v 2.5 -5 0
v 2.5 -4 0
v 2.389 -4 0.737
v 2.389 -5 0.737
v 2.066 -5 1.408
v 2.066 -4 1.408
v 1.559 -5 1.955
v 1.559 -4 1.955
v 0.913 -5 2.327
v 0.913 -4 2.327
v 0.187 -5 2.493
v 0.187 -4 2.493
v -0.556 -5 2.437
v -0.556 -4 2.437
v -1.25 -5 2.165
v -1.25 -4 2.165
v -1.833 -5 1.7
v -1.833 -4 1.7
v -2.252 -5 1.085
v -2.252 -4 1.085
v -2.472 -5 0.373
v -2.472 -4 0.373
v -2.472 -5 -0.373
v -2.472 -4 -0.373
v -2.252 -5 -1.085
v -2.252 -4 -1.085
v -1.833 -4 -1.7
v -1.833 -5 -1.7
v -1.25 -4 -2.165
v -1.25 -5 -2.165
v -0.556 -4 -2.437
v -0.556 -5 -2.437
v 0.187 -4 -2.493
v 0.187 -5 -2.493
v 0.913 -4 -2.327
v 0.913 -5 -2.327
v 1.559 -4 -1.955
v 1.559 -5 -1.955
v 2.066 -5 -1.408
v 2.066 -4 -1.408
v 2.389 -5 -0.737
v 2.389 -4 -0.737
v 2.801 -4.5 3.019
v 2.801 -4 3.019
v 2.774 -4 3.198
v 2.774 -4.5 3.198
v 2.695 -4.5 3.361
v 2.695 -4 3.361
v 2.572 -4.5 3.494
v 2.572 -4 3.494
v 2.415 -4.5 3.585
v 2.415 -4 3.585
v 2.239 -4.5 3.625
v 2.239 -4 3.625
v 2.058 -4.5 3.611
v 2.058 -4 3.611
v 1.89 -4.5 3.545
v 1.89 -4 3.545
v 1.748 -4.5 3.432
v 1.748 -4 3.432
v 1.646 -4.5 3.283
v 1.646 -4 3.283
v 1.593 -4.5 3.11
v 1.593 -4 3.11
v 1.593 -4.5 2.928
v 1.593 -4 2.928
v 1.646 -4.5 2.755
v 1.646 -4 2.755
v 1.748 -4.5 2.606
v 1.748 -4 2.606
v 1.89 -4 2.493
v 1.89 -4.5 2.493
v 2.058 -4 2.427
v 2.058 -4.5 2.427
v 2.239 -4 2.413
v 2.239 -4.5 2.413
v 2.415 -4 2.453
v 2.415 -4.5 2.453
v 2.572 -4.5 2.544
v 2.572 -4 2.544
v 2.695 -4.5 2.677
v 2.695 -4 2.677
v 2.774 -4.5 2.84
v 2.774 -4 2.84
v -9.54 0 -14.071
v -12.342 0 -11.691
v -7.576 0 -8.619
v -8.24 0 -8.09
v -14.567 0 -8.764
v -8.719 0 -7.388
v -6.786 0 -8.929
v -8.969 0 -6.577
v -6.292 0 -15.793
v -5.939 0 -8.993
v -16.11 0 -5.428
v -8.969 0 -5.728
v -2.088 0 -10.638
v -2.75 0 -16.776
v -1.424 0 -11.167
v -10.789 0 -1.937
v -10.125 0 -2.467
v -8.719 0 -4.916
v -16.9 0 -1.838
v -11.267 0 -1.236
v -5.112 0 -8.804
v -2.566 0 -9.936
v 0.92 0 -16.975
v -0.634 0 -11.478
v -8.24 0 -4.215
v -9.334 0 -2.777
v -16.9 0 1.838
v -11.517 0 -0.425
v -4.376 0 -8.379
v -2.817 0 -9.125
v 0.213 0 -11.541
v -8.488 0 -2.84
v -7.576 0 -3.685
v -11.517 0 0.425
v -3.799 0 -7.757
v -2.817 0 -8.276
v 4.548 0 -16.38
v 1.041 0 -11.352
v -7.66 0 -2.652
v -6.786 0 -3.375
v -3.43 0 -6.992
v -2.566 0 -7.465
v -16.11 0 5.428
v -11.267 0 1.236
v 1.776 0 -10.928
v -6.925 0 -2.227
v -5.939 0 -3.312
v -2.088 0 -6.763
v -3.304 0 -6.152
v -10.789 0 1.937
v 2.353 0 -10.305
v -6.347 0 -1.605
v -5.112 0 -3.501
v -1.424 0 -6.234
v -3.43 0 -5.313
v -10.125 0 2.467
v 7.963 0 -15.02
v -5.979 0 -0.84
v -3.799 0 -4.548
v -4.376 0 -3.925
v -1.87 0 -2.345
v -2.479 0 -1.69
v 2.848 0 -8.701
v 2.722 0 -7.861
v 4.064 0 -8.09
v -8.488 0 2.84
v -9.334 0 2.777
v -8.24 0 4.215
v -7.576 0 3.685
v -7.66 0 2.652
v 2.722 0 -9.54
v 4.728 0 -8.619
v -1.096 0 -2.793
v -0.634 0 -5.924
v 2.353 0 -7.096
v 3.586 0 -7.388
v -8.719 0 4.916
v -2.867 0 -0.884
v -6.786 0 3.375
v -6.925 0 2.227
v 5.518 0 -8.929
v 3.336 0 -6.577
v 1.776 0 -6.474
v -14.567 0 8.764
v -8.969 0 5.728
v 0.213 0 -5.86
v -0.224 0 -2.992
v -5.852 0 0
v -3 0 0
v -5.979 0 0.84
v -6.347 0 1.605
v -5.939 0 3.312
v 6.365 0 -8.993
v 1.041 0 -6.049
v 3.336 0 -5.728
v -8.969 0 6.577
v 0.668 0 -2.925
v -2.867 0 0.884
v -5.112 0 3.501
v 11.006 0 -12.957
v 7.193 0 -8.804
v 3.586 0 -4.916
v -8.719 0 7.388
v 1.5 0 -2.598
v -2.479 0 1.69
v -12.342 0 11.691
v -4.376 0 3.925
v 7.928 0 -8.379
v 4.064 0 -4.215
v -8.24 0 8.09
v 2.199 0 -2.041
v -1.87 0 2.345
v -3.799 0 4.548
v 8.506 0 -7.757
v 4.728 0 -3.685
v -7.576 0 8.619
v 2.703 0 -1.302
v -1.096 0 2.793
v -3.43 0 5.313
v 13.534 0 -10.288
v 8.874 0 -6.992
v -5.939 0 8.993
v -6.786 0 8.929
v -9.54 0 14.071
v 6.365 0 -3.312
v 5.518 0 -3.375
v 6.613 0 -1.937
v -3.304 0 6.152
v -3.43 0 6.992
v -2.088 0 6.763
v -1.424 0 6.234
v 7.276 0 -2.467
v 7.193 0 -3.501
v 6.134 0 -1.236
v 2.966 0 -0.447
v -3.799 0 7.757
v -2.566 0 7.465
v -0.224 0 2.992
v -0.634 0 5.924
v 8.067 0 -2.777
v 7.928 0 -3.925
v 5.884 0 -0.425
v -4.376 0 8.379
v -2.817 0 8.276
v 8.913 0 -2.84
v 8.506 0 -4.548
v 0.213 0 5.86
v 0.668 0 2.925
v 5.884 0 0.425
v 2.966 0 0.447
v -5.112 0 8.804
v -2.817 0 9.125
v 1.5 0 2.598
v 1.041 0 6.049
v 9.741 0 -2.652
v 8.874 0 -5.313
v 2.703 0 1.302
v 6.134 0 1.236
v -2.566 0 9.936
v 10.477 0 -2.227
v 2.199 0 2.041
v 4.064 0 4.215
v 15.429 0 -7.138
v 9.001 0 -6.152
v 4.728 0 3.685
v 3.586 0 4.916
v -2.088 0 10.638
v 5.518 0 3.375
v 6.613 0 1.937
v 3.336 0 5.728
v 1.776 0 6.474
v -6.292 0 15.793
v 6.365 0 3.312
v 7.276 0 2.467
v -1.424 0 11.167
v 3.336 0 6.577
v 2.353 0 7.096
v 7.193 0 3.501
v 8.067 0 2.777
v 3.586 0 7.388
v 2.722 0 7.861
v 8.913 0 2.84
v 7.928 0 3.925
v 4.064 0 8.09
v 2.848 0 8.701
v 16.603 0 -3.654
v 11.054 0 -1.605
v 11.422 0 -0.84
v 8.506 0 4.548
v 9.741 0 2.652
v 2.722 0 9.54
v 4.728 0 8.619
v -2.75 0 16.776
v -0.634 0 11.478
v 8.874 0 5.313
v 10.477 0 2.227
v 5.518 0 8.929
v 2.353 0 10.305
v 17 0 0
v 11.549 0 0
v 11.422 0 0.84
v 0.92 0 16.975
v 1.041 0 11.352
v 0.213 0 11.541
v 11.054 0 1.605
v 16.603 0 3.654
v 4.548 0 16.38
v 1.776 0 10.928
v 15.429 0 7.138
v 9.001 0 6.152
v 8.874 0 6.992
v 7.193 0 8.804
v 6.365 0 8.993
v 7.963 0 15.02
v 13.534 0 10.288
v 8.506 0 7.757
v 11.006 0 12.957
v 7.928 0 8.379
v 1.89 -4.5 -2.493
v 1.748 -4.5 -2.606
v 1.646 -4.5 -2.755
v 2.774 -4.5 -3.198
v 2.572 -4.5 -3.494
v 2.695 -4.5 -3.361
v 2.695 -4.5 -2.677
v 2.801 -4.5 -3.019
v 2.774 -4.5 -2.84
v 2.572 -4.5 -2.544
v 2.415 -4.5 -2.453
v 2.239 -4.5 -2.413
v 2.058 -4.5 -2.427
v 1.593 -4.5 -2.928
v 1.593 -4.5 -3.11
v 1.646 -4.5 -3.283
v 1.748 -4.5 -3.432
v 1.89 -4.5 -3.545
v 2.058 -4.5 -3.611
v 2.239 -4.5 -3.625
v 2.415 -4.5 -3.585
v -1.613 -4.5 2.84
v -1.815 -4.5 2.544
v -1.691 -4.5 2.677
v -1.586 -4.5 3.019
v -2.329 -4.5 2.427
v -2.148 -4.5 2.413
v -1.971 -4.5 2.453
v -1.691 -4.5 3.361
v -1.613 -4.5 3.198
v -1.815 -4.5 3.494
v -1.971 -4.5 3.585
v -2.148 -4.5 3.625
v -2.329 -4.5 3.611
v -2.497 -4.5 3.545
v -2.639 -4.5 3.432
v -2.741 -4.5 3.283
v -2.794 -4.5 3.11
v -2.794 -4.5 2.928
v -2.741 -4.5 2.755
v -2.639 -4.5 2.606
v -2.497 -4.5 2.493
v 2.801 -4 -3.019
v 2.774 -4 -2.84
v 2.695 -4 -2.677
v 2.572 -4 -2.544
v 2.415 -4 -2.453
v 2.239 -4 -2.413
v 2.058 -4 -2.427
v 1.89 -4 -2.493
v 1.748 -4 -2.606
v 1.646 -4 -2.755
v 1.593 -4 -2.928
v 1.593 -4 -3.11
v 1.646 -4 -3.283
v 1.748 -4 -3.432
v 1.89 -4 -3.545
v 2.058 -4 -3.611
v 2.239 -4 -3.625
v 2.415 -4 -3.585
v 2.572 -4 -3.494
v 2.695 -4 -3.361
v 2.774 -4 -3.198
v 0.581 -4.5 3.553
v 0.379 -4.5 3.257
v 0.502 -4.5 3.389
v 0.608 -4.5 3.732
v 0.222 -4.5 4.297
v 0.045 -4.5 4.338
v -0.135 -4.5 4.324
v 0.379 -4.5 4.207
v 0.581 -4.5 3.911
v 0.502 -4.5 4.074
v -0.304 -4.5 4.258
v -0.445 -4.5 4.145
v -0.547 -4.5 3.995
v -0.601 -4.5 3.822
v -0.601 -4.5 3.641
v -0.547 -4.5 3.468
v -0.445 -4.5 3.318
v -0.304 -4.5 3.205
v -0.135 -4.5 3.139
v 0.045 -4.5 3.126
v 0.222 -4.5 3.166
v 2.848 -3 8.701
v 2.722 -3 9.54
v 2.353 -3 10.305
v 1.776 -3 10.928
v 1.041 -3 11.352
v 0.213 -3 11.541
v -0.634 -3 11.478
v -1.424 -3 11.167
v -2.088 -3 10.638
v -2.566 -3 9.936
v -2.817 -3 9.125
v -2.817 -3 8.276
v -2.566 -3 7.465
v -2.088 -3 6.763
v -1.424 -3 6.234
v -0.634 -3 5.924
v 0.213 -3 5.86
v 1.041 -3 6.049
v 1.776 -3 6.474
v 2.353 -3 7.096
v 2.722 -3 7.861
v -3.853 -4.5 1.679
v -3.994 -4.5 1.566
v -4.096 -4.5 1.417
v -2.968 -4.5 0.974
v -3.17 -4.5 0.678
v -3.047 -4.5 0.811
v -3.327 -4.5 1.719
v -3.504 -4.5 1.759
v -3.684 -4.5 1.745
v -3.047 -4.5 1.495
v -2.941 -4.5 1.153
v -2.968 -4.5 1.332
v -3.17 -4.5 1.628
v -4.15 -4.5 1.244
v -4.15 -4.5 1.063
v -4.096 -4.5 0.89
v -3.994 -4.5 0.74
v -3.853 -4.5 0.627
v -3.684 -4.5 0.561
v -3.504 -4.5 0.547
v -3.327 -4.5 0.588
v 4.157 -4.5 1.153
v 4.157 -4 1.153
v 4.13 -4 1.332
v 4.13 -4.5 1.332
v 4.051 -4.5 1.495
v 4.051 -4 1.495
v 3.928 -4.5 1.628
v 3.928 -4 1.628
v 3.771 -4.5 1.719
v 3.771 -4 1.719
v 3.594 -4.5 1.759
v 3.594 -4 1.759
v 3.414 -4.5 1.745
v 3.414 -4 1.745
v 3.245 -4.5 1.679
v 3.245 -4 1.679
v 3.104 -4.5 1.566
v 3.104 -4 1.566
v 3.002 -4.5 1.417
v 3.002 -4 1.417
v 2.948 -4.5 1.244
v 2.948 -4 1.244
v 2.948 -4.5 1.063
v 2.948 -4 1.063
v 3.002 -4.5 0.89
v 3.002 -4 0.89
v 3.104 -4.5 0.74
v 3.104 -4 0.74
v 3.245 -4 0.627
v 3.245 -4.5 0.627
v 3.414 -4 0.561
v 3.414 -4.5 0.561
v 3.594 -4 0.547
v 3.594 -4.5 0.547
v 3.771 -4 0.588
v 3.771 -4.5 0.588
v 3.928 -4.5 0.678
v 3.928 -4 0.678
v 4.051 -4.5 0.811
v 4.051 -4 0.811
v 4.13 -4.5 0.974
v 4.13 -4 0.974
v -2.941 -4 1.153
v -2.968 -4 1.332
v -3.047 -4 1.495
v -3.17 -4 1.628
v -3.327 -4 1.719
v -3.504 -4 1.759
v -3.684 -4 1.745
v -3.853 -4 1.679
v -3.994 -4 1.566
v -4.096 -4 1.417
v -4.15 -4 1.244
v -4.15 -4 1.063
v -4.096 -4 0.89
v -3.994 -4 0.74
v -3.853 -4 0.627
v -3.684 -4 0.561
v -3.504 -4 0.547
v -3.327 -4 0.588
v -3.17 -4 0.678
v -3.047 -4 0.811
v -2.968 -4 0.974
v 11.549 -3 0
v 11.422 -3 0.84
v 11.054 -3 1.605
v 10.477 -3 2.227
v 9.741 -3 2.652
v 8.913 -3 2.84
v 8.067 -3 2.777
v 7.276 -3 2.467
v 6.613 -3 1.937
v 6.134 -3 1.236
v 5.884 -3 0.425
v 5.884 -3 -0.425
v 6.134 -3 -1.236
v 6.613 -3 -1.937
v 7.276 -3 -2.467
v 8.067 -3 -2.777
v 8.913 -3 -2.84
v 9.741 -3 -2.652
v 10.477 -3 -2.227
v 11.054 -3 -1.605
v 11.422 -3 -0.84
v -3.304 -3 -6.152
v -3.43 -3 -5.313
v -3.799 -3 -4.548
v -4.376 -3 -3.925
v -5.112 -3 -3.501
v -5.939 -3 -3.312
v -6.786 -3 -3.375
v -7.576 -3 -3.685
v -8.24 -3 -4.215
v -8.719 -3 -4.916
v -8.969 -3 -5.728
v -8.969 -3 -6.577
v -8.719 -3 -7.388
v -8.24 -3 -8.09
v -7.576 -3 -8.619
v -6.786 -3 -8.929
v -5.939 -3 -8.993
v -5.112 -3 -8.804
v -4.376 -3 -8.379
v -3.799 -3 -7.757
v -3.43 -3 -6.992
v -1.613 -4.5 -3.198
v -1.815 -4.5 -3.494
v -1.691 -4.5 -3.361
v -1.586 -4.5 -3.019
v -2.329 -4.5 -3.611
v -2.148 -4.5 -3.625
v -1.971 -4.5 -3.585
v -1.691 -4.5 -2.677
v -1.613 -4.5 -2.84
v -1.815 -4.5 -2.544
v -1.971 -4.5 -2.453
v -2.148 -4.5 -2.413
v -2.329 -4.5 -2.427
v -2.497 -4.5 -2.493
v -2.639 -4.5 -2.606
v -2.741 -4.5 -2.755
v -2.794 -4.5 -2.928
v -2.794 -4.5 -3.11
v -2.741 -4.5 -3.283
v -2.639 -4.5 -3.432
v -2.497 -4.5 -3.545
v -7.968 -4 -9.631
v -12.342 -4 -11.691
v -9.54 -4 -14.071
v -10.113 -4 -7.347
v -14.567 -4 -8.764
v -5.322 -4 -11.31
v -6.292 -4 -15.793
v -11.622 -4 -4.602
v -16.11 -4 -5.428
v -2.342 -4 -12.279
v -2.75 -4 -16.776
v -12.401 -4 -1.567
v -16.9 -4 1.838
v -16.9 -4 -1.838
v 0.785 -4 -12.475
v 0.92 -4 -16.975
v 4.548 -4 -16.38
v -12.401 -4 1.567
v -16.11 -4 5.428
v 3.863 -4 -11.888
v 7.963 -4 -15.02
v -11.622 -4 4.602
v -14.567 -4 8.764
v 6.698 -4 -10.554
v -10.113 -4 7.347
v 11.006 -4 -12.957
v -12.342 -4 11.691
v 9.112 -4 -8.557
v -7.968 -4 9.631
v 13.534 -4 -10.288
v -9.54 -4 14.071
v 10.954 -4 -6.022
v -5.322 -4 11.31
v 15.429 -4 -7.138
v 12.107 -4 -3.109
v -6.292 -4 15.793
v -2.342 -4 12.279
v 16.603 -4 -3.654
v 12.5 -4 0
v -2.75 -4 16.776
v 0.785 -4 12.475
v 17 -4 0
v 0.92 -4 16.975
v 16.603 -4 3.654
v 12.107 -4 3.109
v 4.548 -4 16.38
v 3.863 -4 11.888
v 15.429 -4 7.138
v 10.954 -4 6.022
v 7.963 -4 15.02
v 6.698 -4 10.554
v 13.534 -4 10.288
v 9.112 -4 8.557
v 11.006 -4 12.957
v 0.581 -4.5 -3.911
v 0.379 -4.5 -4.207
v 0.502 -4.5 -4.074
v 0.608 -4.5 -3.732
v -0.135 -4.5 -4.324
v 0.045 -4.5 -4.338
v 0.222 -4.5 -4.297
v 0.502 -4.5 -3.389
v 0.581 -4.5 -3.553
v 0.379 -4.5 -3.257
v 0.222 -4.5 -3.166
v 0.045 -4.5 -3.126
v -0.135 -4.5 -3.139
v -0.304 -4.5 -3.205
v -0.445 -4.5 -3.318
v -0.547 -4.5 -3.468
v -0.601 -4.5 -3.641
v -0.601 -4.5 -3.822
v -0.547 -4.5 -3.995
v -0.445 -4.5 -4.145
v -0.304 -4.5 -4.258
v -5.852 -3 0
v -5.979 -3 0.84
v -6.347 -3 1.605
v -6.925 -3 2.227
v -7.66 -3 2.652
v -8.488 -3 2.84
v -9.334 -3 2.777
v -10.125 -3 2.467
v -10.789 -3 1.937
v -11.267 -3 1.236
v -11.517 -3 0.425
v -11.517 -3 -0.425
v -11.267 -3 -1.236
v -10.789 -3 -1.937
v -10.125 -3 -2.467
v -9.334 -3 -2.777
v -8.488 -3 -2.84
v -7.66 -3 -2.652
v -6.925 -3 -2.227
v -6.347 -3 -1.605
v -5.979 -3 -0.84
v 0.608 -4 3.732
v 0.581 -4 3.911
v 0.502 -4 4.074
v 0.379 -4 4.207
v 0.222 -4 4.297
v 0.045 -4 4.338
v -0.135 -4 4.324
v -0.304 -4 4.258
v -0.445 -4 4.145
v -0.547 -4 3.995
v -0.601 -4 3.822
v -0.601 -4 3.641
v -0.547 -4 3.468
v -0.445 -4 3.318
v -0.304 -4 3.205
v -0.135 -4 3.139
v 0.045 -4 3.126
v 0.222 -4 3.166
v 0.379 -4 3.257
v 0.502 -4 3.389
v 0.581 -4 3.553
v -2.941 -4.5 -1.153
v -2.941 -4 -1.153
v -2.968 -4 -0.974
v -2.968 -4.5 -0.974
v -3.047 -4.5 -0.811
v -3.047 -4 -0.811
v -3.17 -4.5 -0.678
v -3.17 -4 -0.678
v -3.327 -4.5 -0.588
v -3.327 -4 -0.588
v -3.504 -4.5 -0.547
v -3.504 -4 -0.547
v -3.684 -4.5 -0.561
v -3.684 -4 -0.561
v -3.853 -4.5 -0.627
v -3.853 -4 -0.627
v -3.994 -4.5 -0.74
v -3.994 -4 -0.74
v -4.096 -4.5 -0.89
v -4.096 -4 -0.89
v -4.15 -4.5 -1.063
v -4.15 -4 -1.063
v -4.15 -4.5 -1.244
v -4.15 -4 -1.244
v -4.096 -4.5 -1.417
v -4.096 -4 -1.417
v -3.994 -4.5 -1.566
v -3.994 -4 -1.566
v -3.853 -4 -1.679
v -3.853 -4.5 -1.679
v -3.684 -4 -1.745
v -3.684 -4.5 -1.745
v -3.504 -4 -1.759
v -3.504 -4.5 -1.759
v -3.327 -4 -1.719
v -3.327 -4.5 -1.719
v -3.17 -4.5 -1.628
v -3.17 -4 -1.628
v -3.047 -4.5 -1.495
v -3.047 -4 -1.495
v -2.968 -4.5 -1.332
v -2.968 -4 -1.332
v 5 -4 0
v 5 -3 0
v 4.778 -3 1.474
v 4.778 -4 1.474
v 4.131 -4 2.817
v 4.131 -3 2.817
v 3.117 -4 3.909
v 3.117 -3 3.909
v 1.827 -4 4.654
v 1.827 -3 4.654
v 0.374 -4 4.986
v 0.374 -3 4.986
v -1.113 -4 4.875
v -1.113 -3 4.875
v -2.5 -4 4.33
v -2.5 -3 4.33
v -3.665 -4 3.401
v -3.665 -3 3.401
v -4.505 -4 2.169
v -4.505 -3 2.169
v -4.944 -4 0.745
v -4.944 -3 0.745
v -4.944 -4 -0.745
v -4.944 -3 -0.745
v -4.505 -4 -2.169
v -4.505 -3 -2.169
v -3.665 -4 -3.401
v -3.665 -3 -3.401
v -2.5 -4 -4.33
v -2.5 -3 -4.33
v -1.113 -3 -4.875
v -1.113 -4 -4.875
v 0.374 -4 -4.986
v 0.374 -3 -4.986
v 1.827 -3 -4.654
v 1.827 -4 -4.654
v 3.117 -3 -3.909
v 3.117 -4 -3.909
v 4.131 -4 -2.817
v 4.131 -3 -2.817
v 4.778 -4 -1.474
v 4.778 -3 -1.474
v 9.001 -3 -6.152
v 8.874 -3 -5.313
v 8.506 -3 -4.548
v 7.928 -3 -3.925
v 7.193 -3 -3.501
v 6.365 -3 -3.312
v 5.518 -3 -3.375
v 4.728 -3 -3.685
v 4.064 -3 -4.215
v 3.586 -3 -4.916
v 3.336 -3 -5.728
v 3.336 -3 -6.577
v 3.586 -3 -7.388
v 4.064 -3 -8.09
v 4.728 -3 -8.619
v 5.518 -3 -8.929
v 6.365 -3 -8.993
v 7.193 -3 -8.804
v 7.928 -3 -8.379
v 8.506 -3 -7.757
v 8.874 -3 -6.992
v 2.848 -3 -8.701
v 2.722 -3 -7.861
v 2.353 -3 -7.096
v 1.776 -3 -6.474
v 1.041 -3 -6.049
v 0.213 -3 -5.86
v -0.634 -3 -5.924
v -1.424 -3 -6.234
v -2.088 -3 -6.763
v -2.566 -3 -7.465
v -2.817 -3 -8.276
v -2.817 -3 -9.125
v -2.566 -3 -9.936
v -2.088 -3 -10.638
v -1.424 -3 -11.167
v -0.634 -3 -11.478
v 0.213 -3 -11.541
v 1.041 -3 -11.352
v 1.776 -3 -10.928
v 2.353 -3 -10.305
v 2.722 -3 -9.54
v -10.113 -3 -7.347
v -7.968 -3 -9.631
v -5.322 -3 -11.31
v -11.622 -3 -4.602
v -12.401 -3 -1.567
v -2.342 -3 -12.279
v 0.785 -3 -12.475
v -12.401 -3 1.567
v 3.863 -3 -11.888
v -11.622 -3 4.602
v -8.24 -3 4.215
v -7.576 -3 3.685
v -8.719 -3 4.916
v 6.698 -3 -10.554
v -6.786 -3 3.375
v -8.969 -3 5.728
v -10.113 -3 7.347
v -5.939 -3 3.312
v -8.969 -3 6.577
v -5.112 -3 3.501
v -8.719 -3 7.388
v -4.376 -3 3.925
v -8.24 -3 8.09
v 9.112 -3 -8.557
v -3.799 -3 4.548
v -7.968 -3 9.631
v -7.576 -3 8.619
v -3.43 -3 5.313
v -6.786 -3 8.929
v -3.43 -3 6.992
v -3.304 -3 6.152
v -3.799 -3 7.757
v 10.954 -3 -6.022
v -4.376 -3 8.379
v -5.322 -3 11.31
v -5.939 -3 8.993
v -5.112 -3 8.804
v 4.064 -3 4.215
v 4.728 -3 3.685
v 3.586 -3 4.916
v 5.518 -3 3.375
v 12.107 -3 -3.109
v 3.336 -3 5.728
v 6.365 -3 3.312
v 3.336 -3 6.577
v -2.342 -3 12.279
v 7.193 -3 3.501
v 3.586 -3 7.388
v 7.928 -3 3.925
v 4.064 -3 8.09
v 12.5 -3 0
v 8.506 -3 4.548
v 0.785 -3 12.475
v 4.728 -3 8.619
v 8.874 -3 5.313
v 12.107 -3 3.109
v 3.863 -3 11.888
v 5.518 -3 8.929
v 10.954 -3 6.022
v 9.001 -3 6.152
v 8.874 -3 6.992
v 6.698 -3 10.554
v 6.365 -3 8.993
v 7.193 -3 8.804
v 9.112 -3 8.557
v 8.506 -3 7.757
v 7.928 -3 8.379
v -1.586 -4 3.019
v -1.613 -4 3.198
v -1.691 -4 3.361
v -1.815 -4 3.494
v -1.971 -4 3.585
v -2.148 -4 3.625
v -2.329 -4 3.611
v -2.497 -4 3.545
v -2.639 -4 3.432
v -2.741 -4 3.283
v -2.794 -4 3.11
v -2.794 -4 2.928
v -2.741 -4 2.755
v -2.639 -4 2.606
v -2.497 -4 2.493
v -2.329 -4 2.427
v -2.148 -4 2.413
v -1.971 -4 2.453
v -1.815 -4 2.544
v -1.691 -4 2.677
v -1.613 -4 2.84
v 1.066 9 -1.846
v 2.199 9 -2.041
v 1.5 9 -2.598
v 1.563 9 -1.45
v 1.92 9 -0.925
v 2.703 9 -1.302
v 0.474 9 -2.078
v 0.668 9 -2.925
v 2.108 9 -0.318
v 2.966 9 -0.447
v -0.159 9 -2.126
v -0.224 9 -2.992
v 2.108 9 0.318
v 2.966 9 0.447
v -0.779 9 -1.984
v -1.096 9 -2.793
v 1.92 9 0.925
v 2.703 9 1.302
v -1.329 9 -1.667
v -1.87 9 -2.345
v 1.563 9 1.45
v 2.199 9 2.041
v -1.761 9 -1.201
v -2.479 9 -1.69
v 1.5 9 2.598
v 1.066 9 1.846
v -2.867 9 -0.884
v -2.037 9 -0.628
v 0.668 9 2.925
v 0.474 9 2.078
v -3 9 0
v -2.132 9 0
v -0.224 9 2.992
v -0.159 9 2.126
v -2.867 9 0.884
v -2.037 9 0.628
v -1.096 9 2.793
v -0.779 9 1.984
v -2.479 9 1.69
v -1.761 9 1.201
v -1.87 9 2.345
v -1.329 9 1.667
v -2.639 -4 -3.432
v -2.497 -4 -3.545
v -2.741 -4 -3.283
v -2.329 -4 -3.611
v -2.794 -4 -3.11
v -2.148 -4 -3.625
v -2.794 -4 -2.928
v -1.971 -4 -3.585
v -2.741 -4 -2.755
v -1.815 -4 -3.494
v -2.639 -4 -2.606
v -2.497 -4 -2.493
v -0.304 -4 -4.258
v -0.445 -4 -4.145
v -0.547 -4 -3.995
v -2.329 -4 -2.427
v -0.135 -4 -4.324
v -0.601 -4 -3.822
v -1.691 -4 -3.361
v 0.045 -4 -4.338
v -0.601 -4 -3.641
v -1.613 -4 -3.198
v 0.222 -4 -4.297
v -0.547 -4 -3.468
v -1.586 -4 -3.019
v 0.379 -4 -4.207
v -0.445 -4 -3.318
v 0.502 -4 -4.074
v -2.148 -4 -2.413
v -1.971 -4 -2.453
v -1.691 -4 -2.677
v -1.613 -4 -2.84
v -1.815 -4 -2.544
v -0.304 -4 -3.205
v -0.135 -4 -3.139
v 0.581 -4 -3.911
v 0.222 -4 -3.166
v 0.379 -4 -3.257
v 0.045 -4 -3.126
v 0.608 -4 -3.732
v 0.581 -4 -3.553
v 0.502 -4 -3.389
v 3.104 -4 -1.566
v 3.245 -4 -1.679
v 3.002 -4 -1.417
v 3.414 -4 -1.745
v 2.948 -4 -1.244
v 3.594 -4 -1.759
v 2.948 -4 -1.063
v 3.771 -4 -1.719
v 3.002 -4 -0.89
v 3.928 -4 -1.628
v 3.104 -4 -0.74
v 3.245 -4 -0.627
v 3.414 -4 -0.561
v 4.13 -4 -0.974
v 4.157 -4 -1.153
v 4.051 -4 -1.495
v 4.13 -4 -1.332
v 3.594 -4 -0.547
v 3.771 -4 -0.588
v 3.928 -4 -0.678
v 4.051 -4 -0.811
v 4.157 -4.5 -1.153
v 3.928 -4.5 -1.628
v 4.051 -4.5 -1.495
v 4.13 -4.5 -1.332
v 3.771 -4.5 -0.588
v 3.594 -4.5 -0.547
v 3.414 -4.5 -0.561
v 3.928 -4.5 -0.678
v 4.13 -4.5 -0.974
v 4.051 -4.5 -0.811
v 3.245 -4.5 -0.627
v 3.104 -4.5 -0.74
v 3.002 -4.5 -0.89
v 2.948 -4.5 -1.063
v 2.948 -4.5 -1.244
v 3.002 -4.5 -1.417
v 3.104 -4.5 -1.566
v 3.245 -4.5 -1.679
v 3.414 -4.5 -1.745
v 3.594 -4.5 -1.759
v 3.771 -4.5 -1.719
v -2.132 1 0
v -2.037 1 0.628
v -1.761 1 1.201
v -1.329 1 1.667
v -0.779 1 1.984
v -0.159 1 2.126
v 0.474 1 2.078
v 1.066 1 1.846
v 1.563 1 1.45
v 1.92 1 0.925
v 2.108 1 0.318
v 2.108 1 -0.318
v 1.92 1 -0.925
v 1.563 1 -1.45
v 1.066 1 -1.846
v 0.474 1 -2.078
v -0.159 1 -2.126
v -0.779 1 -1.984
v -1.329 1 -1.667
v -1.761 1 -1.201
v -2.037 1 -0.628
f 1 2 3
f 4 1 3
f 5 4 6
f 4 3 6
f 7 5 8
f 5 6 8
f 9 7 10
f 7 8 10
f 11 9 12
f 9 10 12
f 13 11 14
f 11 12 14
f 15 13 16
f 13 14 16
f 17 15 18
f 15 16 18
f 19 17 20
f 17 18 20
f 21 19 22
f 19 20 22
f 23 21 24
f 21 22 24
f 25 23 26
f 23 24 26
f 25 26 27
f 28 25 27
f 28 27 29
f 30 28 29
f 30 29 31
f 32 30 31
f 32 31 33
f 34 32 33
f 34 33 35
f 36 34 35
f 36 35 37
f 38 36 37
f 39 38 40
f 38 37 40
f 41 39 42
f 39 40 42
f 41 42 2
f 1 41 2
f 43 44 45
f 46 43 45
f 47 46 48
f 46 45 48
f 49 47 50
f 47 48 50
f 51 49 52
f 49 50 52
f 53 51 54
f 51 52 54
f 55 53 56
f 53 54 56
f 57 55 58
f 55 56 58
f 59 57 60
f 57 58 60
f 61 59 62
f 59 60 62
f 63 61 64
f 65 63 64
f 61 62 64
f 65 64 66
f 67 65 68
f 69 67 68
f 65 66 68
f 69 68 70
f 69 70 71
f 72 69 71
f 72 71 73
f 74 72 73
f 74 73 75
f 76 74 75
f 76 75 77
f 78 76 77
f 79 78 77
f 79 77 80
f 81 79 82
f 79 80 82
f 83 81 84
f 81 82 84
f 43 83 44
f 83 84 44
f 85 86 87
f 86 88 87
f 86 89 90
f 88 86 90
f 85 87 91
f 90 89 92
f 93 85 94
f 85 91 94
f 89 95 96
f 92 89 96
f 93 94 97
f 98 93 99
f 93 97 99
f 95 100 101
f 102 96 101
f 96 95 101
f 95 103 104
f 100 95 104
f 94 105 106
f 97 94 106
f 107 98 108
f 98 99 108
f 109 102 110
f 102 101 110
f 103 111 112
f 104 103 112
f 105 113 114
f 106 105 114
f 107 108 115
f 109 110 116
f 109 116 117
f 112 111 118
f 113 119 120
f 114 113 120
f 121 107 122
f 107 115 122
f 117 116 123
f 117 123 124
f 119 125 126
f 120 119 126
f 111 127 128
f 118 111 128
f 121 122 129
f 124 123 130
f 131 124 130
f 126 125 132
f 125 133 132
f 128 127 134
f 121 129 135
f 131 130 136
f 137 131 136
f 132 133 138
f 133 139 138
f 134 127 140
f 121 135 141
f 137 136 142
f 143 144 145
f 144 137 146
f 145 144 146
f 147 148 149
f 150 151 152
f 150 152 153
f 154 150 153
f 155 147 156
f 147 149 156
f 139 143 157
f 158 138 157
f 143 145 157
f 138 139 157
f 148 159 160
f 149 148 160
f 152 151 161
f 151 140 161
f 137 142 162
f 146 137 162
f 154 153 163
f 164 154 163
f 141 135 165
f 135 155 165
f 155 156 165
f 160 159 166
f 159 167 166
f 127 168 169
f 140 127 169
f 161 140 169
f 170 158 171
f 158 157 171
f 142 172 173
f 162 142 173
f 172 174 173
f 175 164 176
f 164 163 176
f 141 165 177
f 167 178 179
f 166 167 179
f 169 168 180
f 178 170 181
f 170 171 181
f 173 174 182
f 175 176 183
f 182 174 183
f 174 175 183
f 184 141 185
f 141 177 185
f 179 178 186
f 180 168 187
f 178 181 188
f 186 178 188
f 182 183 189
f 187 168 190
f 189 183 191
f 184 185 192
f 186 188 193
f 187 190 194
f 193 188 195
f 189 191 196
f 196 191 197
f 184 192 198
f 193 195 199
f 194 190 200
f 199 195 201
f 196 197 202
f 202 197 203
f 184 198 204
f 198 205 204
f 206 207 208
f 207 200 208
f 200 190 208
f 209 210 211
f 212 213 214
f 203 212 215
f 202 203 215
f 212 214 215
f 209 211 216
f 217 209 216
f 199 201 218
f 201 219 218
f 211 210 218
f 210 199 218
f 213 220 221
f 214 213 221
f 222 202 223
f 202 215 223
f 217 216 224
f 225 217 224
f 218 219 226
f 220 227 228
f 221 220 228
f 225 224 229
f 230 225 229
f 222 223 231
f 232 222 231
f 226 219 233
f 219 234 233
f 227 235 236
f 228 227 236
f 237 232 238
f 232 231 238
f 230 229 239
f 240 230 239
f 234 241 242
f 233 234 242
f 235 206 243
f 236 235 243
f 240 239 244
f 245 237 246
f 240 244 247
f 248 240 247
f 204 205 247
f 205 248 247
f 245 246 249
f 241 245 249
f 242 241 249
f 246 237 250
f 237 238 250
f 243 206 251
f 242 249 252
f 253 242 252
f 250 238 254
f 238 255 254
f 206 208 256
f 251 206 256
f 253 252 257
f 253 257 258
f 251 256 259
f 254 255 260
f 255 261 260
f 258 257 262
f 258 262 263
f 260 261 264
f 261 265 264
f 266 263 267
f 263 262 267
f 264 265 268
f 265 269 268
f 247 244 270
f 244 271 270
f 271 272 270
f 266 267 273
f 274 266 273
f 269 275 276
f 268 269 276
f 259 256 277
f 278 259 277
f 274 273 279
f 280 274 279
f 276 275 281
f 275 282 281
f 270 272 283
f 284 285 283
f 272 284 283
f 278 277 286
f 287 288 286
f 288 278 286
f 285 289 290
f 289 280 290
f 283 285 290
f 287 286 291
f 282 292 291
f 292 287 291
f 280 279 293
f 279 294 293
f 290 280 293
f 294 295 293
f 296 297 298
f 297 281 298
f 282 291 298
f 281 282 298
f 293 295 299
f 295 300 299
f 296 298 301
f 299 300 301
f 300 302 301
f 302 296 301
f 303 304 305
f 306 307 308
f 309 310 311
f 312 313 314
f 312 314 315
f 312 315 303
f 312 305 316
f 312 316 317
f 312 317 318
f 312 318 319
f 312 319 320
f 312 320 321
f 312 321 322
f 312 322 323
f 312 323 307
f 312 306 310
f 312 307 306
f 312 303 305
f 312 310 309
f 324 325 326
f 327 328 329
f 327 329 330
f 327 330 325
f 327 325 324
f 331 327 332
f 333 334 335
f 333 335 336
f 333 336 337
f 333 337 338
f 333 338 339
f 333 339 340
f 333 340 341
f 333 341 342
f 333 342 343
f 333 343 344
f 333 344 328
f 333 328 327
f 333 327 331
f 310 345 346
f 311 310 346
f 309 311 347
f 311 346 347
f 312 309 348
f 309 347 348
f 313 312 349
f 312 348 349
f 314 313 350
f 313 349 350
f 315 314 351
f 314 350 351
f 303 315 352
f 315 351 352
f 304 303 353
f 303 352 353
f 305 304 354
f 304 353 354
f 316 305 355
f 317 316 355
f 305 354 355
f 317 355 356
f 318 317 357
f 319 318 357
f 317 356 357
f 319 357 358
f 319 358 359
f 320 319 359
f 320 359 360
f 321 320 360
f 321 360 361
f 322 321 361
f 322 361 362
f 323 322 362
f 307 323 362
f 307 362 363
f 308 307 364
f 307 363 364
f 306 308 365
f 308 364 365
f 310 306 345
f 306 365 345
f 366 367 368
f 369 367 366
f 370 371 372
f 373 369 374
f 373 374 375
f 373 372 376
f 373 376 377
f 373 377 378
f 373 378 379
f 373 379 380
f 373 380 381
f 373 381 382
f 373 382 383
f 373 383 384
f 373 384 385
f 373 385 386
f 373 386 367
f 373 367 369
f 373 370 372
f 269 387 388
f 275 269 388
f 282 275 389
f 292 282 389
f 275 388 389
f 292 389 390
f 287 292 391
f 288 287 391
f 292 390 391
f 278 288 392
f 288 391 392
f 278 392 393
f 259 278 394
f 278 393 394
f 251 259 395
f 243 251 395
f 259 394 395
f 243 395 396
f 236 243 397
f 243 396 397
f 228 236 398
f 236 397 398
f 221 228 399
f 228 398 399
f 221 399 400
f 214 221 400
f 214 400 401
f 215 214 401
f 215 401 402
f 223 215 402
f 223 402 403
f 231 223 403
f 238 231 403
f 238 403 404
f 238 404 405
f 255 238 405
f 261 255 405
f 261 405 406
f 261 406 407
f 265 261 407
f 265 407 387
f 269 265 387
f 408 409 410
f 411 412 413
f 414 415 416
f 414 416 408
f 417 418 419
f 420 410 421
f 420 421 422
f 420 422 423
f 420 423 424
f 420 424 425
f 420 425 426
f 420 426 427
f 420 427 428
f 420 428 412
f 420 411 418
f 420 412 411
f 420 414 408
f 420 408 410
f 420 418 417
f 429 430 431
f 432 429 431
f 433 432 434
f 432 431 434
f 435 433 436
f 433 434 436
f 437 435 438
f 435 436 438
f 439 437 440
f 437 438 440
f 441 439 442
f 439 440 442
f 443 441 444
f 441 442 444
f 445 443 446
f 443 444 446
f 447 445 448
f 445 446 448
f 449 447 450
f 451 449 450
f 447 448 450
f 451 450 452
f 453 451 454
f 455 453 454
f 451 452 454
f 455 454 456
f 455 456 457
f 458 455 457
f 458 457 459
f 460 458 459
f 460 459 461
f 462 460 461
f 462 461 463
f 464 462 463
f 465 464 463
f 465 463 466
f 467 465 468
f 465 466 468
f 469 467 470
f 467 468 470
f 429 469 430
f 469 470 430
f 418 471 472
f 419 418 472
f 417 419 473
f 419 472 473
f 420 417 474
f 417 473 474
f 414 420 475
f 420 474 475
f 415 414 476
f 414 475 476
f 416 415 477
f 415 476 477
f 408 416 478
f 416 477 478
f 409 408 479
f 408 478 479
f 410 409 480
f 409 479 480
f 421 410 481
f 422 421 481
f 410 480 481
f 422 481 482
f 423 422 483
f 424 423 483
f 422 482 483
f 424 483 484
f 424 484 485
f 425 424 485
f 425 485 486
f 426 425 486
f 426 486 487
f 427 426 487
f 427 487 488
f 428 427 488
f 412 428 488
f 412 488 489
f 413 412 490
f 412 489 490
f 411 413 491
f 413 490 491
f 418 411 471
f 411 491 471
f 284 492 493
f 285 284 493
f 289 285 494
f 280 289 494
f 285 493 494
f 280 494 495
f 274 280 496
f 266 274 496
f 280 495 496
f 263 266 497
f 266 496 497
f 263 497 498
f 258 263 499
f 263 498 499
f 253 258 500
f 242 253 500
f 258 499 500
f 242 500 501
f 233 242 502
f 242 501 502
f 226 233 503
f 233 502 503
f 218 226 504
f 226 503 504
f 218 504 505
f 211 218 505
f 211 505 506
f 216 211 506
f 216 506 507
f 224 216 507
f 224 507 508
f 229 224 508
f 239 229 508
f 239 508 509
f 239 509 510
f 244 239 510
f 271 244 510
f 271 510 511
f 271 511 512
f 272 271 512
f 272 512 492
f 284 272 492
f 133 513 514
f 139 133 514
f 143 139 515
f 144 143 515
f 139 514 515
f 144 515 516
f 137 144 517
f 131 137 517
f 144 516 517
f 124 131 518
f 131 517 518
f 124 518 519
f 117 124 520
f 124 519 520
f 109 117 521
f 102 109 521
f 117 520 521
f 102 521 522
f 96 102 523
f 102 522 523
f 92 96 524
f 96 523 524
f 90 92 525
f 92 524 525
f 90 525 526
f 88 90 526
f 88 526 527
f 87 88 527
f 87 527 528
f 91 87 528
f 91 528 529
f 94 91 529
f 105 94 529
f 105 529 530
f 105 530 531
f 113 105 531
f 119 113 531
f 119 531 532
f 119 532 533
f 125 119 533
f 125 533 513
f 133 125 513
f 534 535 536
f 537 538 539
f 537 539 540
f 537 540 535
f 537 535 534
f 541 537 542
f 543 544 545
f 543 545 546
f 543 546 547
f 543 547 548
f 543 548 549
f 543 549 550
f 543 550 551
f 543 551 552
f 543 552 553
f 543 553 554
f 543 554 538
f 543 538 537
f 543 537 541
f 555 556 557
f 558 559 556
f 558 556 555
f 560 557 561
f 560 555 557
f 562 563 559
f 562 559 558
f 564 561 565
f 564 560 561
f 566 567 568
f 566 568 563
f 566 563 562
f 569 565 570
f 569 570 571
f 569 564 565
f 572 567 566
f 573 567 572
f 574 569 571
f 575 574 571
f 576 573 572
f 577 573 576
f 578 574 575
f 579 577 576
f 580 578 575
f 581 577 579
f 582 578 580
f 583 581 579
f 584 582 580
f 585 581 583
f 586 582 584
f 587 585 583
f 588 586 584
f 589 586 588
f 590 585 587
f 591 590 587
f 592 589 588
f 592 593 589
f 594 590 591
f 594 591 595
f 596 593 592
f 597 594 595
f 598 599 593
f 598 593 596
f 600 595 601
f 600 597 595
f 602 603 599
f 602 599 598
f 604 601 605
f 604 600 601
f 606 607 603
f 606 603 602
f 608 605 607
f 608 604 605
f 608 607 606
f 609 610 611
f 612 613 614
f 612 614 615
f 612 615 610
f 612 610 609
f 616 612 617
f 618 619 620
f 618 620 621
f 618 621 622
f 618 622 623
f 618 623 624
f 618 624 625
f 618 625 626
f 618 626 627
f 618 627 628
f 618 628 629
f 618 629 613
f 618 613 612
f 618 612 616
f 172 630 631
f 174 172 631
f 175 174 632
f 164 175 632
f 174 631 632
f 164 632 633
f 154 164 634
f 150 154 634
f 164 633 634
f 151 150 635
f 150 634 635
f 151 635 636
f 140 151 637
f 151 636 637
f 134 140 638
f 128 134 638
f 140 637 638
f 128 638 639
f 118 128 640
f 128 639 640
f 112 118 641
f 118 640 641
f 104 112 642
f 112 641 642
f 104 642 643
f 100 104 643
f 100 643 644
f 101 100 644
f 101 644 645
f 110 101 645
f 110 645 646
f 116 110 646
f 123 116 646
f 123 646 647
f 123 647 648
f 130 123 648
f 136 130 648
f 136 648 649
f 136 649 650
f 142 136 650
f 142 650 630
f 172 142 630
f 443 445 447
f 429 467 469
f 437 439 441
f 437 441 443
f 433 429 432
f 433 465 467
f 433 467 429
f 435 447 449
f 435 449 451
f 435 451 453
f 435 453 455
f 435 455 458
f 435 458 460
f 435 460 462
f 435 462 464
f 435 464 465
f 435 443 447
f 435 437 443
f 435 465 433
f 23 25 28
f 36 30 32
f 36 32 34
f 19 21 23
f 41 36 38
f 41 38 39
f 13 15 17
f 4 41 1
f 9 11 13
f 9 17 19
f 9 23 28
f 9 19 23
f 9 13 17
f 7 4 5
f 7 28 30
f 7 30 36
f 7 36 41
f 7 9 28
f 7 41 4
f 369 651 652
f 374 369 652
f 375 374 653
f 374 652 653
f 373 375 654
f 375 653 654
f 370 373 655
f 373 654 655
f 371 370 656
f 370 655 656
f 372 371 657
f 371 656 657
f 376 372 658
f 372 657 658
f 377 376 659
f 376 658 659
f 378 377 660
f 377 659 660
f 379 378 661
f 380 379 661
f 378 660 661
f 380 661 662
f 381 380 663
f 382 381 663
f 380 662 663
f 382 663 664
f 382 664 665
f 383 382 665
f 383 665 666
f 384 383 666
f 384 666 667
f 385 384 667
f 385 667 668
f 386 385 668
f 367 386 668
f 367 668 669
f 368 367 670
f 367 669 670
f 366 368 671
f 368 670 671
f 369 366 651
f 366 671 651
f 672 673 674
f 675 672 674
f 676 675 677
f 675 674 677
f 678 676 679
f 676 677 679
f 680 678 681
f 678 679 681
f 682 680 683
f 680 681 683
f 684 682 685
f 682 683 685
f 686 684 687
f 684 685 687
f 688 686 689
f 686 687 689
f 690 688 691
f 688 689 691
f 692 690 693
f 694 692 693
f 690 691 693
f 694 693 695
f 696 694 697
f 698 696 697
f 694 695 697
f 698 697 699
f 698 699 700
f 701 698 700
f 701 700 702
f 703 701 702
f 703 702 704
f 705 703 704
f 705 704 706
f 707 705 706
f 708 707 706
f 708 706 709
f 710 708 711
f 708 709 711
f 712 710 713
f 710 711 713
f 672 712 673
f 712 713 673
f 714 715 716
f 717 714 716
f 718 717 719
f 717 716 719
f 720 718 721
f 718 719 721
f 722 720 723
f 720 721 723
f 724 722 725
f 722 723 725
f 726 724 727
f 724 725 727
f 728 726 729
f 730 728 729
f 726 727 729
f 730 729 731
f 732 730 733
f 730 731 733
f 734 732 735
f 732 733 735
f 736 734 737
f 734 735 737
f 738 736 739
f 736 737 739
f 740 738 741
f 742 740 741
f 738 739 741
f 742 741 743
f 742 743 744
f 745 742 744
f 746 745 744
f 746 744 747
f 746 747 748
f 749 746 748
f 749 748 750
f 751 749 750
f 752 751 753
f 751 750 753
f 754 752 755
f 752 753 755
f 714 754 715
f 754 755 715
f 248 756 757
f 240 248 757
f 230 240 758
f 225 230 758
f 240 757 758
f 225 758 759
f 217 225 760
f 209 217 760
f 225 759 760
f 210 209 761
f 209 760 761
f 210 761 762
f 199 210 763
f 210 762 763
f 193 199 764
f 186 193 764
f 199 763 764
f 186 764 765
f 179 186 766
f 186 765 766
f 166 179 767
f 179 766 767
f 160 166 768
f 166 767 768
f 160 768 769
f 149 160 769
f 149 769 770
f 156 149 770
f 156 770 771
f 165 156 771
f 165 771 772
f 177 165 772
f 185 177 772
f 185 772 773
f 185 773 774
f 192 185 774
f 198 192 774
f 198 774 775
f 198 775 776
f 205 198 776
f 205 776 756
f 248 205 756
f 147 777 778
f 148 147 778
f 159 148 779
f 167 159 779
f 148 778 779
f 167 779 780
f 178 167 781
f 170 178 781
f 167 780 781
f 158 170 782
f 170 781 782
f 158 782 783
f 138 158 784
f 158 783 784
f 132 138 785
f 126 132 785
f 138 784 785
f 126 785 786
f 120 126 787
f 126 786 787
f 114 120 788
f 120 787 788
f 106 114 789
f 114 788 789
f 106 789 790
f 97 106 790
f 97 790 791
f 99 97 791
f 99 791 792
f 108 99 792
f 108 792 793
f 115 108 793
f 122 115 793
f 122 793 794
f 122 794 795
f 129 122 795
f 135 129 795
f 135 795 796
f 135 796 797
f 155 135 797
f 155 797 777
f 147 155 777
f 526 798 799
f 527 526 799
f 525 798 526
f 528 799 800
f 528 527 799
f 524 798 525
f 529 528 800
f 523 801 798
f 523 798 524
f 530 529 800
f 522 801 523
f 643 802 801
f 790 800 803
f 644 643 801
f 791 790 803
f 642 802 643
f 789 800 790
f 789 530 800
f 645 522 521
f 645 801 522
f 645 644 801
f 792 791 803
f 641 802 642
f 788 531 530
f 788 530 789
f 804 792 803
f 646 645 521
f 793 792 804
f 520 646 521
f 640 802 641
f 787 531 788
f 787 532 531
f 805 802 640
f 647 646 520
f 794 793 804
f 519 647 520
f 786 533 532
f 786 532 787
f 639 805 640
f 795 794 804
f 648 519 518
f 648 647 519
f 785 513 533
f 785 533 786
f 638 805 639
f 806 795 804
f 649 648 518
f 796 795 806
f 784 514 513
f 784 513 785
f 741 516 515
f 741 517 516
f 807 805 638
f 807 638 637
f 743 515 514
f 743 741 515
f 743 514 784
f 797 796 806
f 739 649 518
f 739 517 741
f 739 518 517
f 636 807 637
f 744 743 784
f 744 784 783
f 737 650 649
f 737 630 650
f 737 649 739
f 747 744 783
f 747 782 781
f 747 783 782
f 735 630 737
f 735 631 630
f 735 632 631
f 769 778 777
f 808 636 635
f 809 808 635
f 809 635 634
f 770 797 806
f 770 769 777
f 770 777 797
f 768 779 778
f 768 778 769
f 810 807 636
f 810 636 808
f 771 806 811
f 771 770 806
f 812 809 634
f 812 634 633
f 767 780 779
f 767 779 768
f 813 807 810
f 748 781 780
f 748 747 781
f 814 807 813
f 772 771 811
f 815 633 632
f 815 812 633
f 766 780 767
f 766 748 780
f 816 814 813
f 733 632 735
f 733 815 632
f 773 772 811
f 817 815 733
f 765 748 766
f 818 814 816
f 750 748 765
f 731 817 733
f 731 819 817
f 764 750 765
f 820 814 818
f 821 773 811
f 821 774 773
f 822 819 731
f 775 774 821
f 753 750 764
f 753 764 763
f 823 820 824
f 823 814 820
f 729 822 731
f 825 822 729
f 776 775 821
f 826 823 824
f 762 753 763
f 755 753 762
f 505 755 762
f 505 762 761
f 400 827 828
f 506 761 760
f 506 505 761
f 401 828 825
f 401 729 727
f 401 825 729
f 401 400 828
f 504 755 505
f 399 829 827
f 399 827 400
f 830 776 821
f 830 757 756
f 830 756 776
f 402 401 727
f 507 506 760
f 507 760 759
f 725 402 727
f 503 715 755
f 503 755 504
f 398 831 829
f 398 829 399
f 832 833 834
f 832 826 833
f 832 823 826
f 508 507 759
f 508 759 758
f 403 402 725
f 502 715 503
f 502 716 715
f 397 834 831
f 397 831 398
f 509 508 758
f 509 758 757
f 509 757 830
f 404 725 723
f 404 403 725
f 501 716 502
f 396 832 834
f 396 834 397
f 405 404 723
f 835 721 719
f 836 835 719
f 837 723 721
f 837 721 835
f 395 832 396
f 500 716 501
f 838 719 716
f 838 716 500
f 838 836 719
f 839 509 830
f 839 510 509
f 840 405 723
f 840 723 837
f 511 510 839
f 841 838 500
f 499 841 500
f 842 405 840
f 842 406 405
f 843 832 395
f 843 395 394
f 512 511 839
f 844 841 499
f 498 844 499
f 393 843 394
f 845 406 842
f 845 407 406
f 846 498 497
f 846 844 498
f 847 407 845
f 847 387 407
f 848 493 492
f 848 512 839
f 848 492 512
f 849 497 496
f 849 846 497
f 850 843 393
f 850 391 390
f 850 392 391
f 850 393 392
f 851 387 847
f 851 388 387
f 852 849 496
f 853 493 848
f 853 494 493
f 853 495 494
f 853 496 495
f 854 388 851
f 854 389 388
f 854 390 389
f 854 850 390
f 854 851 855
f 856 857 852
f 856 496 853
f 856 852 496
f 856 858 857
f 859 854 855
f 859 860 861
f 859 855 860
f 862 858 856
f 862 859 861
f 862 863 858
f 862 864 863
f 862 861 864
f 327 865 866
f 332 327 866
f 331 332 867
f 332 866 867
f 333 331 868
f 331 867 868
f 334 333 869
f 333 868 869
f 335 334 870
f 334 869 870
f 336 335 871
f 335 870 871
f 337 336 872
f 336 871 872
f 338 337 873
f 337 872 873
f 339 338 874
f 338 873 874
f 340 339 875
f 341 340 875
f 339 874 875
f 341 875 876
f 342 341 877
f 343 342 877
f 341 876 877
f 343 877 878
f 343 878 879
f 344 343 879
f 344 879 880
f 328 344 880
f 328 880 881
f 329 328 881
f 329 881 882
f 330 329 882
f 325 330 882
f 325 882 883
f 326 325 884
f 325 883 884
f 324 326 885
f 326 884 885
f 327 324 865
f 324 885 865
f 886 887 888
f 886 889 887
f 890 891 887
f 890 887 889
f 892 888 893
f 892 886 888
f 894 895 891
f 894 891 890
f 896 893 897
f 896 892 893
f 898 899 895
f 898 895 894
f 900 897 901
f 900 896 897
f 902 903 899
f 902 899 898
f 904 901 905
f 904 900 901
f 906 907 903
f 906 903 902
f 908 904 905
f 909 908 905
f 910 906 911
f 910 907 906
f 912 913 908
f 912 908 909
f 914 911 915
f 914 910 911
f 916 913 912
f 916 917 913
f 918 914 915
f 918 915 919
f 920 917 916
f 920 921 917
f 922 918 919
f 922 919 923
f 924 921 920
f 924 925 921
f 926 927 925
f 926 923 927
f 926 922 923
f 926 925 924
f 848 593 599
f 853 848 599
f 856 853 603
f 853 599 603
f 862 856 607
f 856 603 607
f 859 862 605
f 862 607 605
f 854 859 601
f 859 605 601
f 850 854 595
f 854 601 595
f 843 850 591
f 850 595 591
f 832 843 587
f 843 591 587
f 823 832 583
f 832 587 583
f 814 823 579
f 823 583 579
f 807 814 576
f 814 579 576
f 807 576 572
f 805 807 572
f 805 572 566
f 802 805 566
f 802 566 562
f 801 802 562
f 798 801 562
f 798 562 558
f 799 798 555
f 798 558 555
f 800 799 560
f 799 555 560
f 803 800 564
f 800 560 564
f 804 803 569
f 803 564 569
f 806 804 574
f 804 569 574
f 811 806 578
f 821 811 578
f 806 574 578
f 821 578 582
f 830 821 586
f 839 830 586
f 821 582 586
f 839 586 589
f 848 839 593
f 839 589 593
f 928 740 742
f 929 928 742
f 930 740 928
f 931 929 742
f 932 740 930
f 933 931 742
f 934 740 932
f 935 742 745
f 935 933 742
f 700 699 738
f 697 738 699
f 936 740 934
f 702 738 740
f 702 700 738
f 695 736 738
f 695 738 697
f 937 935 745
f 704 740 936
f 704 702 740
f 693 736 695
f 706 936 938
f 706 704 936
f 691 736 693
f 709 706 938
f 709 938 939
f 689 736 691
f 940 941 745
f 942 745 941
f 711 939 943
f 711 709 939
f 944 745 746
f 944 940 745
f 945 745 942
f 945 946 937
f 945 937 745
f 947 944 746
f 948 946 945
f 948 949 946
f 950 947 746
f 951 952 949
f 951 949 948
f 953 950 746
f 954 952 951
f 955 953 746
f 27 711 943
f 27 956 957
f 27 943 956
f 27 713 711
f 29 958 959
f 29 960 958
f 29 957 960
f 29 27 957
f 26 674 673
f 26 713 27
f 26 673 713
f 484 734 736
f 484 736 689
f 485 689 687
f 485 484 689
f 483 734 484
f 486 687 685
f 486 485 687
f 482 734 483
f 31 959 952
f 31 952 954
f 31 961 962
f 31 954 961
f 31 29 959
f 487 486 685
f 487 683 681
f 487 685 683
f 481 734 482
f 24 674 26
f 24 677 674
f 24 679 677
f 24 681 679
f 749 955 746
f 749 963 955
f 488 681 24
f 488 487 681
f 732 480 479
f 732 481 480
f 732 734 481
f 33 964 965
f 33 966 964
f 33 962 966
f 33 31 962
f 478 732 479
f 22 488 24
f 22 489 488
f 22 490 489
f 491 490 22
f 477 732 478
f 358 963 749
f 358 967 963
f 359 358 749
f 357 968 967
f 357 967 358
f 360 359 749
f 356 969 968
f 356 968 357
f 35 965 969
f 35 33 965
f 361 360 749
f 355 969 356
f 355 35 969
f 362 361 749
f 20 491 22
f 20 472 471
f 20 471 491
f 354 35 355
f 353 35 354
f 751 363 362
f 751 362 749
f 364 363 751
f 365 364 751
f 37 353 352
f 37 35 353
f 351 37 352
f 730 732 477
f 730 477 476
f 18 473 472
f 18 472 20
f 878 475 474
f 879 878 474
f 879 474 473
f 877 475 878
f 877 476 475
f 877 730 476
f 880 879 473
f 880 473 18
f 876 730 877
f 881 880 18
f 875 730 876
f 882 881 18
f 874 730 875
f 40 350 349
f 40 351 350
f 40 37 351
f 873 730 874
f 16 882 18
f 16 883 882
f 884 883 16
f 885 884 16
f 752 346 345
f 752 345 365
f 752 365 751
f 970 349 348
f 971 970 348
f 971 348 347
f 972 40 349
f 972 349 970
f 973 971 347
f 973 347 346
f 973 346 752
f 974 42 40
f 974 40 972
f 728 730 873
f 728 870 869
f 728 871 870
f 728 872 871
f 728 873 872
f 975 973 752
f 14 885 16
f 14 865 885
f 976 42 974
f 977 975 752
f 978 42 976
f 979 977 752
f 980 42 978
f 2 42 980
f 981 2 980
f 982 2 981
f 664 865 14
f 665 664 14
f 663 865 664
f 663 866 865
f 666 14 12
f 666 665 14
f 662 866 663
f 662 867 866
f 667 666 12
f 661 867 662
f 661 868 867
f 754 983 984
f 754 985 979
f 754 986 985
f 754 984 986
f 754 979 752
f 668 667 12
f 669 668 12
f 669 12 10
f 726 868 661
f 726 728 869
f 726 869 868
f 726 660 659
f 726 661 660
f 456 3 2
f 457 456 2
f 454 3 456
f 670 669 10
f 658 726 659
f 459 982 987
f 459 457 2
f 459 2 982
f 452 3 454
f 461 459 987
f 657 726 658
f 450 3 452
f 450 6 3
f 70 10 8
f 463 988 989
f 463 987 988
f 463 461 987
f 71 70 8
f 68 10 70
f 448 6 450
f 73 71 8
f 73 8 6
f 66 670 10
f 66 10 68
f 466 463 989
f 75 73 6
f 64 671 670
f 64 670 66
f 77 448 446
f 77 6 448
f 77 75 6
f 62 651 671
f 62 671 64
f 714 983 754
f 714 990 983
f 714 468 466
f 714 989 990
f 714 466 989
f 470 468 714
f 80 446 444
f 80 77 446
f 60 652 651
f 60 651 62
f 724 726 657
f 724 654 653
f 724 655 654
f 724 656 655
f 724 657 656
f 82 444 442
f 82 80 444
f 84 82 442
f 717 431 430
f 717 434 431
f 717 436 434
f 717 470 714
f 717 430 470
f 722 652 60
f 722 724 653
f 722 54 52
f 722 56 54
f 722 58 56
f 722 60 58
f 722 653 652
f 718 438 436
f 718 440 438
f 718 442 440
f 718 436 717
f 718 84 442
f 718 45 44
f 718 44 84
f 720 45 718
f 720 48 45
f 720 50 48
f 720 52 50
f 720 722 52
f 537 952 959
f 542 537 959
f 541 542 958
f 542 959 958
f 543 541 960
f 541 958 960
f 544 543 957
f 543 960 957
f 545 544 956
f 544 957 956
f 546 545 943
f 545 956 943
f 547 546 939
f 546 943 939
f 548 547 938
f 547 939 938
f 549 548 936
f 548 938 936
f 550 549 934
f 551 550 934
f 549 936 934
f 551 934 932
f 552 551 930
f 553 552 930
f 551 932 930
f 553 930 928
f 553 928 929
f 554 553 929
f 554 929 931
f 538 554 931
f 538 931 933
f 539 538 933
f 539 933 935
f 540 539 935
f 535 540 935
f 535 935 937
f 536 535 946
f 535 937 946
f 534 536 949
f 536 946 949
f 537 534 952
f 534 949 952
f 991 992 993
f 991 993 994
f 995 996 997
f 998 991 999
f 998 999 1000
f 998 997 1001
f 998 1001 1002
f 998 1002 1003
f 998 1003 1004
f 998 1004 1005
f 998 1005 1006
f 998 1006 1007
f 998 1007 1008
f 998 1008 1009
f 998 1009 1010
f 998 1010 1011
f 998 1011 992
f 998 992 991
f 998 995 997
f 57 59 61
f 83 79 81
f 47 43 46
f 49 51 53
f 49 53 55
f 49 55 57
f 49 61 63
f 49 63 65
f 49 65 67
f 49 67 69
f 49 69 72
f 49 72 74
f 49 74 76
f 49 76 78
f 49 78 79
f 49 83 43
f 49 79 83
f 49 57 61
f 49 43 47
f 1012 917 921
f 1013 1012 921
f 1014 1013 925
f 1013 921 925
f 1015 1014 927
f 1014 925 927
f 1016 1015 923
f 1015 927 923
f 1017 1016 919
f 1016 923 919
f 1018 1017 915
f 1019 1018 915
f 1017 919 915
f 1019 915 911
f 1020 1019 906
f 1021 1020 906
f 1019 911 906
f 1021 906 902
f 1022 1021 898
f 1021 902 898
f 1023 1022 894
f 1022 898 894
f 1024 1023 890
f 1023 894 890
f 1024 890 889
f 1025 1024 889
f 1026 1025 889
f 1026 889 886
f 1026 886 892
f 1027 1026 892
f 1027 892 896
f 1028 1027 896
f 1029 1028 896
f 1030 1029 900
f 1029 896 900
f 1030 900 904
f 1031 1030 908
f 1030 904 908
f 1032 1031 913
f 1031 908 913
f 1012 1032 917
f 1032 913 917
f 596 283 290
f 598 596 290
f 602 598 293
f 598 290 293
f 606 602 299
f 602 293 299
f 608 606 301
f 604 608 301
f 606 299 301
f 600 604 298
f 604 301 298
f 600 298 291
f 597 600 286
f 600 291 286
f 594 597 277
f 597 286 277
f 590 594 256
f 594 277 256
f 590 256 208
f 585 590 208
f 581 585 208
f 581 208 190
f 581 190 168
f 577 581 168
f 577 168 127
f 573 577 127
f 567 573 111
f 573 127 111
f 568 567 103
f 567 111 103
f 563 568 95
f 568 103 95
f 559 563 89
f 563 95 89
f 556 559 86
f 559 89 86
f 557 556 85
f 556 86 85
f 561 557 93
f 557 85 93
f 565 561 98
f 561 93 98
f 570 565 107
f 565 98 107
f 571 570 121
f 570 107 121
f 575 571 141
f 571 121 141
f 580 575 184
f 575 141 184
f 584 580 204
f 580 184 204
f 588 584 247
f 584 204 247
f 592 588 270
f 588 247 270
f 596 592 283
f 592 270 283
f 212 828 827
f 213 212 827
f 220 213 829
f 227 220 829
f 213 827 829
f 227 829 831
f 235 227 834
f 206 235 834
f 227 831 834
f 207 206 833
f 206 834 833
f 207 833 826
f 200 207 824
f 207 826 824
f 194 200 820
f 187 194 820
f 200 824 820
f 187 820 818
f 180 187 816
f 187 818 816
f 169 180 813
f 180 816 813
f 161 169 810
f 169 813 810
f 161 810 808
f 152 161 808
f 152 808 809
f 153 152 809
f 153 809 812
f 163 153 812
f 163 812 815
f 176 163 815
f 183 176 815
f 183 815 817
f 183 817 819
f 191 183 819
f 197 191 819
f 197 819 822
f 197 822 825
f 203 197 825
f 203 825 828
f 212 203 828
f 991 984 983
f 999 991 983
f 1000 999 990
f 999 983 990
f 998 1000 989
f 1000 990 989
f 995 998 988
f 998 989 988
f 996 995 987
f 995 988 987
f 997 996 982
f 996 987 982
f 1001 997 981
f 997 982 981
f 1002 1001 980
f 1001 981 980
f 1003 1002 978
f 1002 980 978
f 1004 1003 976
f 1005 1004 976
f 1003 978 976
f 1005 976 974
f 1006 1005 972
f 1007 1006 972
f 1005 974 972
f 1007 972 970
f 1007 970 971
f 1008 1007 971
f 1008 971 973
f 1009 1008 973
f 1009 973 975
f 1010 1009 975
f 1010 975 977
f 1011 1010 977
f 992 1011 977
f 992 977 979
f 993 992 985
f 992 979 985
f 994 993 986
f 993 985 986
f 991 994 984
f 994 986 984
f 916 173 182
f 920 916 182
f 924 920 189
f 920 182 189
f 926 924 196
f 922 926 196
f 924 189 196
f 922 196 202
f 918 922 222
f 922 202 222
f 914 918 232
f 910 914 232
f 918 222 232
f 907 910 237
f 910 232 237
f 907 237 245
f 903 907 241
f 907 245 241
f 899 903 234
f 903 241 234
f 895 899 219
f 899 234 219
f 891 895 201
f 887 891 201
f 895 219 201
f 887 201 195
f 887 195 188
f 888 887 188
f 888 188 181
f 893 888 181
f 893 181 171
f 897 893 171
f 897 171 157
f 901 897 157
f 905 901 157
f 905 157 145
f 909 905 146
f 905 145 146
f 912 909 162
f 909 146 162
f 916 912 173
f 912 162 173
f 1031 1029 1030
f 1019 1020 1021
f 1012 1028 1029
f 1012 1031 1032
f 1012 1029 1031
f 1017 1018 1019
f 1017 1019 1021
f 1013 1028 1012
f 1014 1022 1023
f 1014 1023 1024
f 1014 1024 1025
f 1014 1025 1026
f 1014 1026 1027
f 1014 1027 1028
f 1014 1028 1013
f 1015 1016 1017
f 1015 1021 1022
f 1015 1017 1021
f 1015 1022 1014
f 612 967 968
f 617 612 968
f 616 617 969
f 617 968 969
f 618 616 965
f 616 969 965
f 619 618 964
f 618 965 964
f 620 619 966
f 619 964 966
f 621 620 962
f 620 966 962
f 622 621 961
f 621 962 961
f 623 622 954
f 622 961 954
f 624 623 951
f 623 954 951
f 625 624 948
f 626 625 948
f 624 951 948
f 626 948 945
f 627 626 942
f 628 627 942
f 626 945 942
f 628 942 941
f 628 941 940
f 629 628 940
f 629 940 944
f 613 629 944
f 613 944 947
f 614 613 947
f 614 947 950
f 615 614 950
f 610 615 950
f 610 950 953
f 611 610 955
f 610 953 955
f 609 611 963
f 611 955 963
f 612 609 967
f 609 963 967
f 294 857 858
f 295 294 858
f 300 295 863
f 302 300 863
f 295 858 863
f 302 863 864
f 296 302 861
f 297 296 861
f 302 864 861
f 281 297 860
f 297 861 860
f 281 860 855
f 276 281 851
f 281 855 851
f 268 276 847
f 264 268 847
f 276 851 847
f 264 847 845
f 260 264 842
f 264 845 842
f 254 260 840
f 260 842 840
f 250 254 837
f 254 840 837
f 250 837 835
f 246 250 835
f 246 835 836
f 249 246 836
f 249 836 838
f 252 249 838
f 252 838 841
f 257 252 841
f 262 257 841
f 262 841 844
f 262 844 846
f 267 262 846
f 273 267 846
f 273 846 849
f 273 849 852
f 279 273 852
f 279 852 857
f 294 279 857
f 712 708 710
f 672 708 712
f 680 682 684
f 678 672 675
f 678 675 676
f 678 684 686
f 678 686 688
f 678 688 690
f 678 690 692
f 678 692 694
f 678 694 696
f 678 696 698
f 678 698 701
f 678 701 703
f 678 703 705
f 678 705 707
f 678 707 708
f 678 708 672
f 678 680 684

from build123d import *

# Parameters (mm, degrees)
F0_R      = 17
F1_DEPTH  = 4
F2_R      = 12.5
F3_DEPTH  = 1
F4_R      = 5
F5_DEPTH  = 1
F6_R      = 2.5
F7_DEPTH  = 1
F8_R      = 2.848441
F9_DEPTH  = 5
F10_R     = 0.607579
F11_DEPTH = 0.5
F12_R     = 3
F13_DEPTH = 9
F14_R     = 2.131579
F15_DEPTH = 8


with BuildPart() as f1:
    # F0 (on Front) → F1 (new body)
    with BuildSketch(Plane.XZ):
        Circle(F0_R)
    extrude(amount=F1_DEPTH)

    # F2 (on face) → F3 (cut)
    with BuildSketch(Plane.XZ.offset(4)):
        Circle(F2_R)
    extrude(amount=-F3_DEPTH, mode=Mode.SUBTRACT)

    # F4 (on face) → F5 (join)
    with BuildSketch(Plane.XZ.offset(3)):
        Circle(F4_R)
    extrude(amount=F5_DEPTH)

    # F6 (on face) → F7 (join)
    with BuildSketch(Plane.XZ.offset(4)):
        Circle(F6_R)
    extrude(amount=F7_DEPTH)

    # F8 (on face) → F9 (cut)
    with BuildSketch(Plane.XZ.offset(3)):
        with Locations((-6.152258, 6.152258)):
            Circle(F8_R)
        with Locations((-8.700607, 0)):
            Circle(F8_R)
        with Locations((-6.152258, -6.152258)):
            Circle(F8_R)
        with Locations((0, -8.700607)):
            Circle(F8_R)
        with Locations((6.152258, -6.152258)):
            Circle(F8_R)
        with Locations((8.700607, 0)):
            Circle(F8_R)
        with Locations((6.152258, 6.152258)):
            Circle(F8_R)
        with Locations((0, 8.700607)):
            Circle(F8_R)
    extrude(amount=-F9_DEPTH, mode=Mode.SUBTRACT)

    # F10 (on face) → F11 (join)
    with BuildSketch(Plane.XZ.offset(4)):
        with Locations((0, 3.731649)):
            Circle(F10_R)
        with Locations((-2.193408, 3.018968)):
            Circle(F10_R)
        with Locations((-3.549009, 1.153143)):
            Circle(F10_R)
        with Locations((-3.549009, -1.153143)):
            Circle(F10_R)
        with Locations((-2.193408, -3.018968)):
            Circle(F10_R)
        with Locations((0, -3.731649)):
            Circle(F10_R)
        with Locations((2.193408, -3.018968)):
            Circle(F10_R)
        with Locations((3.549009, -1.153143)):
            Circle(F10_R)
        with Locations((3.549009, 1.153143)):
            Circle(F10_R)
        with Locations((2.193408, 3.018968)):
            Circle(F10_R)
    extrude(amount=F11_DEPTH)

    # F12 (on face) → F13 (join)
    with BuildSketch(Plane(origin=(0, 0, 0), x_dir=(-1, 0, 0), z_dir=(0, 1, 0))):
        Circle(F12_R)
    extrude(amount=F13_DEPTH)

    # F14 (on face) → F15 (cut)
    with BuildSketch(Plane(origin=(0, 9, 0), x_dir=(-1, 0, 0), z_dir=(0, 1, 0))):
        Circle(F14_R)
    extrude(amount=-F15_DEPTH, mode=Mode.SUBTRACT)


solid = f1.part
